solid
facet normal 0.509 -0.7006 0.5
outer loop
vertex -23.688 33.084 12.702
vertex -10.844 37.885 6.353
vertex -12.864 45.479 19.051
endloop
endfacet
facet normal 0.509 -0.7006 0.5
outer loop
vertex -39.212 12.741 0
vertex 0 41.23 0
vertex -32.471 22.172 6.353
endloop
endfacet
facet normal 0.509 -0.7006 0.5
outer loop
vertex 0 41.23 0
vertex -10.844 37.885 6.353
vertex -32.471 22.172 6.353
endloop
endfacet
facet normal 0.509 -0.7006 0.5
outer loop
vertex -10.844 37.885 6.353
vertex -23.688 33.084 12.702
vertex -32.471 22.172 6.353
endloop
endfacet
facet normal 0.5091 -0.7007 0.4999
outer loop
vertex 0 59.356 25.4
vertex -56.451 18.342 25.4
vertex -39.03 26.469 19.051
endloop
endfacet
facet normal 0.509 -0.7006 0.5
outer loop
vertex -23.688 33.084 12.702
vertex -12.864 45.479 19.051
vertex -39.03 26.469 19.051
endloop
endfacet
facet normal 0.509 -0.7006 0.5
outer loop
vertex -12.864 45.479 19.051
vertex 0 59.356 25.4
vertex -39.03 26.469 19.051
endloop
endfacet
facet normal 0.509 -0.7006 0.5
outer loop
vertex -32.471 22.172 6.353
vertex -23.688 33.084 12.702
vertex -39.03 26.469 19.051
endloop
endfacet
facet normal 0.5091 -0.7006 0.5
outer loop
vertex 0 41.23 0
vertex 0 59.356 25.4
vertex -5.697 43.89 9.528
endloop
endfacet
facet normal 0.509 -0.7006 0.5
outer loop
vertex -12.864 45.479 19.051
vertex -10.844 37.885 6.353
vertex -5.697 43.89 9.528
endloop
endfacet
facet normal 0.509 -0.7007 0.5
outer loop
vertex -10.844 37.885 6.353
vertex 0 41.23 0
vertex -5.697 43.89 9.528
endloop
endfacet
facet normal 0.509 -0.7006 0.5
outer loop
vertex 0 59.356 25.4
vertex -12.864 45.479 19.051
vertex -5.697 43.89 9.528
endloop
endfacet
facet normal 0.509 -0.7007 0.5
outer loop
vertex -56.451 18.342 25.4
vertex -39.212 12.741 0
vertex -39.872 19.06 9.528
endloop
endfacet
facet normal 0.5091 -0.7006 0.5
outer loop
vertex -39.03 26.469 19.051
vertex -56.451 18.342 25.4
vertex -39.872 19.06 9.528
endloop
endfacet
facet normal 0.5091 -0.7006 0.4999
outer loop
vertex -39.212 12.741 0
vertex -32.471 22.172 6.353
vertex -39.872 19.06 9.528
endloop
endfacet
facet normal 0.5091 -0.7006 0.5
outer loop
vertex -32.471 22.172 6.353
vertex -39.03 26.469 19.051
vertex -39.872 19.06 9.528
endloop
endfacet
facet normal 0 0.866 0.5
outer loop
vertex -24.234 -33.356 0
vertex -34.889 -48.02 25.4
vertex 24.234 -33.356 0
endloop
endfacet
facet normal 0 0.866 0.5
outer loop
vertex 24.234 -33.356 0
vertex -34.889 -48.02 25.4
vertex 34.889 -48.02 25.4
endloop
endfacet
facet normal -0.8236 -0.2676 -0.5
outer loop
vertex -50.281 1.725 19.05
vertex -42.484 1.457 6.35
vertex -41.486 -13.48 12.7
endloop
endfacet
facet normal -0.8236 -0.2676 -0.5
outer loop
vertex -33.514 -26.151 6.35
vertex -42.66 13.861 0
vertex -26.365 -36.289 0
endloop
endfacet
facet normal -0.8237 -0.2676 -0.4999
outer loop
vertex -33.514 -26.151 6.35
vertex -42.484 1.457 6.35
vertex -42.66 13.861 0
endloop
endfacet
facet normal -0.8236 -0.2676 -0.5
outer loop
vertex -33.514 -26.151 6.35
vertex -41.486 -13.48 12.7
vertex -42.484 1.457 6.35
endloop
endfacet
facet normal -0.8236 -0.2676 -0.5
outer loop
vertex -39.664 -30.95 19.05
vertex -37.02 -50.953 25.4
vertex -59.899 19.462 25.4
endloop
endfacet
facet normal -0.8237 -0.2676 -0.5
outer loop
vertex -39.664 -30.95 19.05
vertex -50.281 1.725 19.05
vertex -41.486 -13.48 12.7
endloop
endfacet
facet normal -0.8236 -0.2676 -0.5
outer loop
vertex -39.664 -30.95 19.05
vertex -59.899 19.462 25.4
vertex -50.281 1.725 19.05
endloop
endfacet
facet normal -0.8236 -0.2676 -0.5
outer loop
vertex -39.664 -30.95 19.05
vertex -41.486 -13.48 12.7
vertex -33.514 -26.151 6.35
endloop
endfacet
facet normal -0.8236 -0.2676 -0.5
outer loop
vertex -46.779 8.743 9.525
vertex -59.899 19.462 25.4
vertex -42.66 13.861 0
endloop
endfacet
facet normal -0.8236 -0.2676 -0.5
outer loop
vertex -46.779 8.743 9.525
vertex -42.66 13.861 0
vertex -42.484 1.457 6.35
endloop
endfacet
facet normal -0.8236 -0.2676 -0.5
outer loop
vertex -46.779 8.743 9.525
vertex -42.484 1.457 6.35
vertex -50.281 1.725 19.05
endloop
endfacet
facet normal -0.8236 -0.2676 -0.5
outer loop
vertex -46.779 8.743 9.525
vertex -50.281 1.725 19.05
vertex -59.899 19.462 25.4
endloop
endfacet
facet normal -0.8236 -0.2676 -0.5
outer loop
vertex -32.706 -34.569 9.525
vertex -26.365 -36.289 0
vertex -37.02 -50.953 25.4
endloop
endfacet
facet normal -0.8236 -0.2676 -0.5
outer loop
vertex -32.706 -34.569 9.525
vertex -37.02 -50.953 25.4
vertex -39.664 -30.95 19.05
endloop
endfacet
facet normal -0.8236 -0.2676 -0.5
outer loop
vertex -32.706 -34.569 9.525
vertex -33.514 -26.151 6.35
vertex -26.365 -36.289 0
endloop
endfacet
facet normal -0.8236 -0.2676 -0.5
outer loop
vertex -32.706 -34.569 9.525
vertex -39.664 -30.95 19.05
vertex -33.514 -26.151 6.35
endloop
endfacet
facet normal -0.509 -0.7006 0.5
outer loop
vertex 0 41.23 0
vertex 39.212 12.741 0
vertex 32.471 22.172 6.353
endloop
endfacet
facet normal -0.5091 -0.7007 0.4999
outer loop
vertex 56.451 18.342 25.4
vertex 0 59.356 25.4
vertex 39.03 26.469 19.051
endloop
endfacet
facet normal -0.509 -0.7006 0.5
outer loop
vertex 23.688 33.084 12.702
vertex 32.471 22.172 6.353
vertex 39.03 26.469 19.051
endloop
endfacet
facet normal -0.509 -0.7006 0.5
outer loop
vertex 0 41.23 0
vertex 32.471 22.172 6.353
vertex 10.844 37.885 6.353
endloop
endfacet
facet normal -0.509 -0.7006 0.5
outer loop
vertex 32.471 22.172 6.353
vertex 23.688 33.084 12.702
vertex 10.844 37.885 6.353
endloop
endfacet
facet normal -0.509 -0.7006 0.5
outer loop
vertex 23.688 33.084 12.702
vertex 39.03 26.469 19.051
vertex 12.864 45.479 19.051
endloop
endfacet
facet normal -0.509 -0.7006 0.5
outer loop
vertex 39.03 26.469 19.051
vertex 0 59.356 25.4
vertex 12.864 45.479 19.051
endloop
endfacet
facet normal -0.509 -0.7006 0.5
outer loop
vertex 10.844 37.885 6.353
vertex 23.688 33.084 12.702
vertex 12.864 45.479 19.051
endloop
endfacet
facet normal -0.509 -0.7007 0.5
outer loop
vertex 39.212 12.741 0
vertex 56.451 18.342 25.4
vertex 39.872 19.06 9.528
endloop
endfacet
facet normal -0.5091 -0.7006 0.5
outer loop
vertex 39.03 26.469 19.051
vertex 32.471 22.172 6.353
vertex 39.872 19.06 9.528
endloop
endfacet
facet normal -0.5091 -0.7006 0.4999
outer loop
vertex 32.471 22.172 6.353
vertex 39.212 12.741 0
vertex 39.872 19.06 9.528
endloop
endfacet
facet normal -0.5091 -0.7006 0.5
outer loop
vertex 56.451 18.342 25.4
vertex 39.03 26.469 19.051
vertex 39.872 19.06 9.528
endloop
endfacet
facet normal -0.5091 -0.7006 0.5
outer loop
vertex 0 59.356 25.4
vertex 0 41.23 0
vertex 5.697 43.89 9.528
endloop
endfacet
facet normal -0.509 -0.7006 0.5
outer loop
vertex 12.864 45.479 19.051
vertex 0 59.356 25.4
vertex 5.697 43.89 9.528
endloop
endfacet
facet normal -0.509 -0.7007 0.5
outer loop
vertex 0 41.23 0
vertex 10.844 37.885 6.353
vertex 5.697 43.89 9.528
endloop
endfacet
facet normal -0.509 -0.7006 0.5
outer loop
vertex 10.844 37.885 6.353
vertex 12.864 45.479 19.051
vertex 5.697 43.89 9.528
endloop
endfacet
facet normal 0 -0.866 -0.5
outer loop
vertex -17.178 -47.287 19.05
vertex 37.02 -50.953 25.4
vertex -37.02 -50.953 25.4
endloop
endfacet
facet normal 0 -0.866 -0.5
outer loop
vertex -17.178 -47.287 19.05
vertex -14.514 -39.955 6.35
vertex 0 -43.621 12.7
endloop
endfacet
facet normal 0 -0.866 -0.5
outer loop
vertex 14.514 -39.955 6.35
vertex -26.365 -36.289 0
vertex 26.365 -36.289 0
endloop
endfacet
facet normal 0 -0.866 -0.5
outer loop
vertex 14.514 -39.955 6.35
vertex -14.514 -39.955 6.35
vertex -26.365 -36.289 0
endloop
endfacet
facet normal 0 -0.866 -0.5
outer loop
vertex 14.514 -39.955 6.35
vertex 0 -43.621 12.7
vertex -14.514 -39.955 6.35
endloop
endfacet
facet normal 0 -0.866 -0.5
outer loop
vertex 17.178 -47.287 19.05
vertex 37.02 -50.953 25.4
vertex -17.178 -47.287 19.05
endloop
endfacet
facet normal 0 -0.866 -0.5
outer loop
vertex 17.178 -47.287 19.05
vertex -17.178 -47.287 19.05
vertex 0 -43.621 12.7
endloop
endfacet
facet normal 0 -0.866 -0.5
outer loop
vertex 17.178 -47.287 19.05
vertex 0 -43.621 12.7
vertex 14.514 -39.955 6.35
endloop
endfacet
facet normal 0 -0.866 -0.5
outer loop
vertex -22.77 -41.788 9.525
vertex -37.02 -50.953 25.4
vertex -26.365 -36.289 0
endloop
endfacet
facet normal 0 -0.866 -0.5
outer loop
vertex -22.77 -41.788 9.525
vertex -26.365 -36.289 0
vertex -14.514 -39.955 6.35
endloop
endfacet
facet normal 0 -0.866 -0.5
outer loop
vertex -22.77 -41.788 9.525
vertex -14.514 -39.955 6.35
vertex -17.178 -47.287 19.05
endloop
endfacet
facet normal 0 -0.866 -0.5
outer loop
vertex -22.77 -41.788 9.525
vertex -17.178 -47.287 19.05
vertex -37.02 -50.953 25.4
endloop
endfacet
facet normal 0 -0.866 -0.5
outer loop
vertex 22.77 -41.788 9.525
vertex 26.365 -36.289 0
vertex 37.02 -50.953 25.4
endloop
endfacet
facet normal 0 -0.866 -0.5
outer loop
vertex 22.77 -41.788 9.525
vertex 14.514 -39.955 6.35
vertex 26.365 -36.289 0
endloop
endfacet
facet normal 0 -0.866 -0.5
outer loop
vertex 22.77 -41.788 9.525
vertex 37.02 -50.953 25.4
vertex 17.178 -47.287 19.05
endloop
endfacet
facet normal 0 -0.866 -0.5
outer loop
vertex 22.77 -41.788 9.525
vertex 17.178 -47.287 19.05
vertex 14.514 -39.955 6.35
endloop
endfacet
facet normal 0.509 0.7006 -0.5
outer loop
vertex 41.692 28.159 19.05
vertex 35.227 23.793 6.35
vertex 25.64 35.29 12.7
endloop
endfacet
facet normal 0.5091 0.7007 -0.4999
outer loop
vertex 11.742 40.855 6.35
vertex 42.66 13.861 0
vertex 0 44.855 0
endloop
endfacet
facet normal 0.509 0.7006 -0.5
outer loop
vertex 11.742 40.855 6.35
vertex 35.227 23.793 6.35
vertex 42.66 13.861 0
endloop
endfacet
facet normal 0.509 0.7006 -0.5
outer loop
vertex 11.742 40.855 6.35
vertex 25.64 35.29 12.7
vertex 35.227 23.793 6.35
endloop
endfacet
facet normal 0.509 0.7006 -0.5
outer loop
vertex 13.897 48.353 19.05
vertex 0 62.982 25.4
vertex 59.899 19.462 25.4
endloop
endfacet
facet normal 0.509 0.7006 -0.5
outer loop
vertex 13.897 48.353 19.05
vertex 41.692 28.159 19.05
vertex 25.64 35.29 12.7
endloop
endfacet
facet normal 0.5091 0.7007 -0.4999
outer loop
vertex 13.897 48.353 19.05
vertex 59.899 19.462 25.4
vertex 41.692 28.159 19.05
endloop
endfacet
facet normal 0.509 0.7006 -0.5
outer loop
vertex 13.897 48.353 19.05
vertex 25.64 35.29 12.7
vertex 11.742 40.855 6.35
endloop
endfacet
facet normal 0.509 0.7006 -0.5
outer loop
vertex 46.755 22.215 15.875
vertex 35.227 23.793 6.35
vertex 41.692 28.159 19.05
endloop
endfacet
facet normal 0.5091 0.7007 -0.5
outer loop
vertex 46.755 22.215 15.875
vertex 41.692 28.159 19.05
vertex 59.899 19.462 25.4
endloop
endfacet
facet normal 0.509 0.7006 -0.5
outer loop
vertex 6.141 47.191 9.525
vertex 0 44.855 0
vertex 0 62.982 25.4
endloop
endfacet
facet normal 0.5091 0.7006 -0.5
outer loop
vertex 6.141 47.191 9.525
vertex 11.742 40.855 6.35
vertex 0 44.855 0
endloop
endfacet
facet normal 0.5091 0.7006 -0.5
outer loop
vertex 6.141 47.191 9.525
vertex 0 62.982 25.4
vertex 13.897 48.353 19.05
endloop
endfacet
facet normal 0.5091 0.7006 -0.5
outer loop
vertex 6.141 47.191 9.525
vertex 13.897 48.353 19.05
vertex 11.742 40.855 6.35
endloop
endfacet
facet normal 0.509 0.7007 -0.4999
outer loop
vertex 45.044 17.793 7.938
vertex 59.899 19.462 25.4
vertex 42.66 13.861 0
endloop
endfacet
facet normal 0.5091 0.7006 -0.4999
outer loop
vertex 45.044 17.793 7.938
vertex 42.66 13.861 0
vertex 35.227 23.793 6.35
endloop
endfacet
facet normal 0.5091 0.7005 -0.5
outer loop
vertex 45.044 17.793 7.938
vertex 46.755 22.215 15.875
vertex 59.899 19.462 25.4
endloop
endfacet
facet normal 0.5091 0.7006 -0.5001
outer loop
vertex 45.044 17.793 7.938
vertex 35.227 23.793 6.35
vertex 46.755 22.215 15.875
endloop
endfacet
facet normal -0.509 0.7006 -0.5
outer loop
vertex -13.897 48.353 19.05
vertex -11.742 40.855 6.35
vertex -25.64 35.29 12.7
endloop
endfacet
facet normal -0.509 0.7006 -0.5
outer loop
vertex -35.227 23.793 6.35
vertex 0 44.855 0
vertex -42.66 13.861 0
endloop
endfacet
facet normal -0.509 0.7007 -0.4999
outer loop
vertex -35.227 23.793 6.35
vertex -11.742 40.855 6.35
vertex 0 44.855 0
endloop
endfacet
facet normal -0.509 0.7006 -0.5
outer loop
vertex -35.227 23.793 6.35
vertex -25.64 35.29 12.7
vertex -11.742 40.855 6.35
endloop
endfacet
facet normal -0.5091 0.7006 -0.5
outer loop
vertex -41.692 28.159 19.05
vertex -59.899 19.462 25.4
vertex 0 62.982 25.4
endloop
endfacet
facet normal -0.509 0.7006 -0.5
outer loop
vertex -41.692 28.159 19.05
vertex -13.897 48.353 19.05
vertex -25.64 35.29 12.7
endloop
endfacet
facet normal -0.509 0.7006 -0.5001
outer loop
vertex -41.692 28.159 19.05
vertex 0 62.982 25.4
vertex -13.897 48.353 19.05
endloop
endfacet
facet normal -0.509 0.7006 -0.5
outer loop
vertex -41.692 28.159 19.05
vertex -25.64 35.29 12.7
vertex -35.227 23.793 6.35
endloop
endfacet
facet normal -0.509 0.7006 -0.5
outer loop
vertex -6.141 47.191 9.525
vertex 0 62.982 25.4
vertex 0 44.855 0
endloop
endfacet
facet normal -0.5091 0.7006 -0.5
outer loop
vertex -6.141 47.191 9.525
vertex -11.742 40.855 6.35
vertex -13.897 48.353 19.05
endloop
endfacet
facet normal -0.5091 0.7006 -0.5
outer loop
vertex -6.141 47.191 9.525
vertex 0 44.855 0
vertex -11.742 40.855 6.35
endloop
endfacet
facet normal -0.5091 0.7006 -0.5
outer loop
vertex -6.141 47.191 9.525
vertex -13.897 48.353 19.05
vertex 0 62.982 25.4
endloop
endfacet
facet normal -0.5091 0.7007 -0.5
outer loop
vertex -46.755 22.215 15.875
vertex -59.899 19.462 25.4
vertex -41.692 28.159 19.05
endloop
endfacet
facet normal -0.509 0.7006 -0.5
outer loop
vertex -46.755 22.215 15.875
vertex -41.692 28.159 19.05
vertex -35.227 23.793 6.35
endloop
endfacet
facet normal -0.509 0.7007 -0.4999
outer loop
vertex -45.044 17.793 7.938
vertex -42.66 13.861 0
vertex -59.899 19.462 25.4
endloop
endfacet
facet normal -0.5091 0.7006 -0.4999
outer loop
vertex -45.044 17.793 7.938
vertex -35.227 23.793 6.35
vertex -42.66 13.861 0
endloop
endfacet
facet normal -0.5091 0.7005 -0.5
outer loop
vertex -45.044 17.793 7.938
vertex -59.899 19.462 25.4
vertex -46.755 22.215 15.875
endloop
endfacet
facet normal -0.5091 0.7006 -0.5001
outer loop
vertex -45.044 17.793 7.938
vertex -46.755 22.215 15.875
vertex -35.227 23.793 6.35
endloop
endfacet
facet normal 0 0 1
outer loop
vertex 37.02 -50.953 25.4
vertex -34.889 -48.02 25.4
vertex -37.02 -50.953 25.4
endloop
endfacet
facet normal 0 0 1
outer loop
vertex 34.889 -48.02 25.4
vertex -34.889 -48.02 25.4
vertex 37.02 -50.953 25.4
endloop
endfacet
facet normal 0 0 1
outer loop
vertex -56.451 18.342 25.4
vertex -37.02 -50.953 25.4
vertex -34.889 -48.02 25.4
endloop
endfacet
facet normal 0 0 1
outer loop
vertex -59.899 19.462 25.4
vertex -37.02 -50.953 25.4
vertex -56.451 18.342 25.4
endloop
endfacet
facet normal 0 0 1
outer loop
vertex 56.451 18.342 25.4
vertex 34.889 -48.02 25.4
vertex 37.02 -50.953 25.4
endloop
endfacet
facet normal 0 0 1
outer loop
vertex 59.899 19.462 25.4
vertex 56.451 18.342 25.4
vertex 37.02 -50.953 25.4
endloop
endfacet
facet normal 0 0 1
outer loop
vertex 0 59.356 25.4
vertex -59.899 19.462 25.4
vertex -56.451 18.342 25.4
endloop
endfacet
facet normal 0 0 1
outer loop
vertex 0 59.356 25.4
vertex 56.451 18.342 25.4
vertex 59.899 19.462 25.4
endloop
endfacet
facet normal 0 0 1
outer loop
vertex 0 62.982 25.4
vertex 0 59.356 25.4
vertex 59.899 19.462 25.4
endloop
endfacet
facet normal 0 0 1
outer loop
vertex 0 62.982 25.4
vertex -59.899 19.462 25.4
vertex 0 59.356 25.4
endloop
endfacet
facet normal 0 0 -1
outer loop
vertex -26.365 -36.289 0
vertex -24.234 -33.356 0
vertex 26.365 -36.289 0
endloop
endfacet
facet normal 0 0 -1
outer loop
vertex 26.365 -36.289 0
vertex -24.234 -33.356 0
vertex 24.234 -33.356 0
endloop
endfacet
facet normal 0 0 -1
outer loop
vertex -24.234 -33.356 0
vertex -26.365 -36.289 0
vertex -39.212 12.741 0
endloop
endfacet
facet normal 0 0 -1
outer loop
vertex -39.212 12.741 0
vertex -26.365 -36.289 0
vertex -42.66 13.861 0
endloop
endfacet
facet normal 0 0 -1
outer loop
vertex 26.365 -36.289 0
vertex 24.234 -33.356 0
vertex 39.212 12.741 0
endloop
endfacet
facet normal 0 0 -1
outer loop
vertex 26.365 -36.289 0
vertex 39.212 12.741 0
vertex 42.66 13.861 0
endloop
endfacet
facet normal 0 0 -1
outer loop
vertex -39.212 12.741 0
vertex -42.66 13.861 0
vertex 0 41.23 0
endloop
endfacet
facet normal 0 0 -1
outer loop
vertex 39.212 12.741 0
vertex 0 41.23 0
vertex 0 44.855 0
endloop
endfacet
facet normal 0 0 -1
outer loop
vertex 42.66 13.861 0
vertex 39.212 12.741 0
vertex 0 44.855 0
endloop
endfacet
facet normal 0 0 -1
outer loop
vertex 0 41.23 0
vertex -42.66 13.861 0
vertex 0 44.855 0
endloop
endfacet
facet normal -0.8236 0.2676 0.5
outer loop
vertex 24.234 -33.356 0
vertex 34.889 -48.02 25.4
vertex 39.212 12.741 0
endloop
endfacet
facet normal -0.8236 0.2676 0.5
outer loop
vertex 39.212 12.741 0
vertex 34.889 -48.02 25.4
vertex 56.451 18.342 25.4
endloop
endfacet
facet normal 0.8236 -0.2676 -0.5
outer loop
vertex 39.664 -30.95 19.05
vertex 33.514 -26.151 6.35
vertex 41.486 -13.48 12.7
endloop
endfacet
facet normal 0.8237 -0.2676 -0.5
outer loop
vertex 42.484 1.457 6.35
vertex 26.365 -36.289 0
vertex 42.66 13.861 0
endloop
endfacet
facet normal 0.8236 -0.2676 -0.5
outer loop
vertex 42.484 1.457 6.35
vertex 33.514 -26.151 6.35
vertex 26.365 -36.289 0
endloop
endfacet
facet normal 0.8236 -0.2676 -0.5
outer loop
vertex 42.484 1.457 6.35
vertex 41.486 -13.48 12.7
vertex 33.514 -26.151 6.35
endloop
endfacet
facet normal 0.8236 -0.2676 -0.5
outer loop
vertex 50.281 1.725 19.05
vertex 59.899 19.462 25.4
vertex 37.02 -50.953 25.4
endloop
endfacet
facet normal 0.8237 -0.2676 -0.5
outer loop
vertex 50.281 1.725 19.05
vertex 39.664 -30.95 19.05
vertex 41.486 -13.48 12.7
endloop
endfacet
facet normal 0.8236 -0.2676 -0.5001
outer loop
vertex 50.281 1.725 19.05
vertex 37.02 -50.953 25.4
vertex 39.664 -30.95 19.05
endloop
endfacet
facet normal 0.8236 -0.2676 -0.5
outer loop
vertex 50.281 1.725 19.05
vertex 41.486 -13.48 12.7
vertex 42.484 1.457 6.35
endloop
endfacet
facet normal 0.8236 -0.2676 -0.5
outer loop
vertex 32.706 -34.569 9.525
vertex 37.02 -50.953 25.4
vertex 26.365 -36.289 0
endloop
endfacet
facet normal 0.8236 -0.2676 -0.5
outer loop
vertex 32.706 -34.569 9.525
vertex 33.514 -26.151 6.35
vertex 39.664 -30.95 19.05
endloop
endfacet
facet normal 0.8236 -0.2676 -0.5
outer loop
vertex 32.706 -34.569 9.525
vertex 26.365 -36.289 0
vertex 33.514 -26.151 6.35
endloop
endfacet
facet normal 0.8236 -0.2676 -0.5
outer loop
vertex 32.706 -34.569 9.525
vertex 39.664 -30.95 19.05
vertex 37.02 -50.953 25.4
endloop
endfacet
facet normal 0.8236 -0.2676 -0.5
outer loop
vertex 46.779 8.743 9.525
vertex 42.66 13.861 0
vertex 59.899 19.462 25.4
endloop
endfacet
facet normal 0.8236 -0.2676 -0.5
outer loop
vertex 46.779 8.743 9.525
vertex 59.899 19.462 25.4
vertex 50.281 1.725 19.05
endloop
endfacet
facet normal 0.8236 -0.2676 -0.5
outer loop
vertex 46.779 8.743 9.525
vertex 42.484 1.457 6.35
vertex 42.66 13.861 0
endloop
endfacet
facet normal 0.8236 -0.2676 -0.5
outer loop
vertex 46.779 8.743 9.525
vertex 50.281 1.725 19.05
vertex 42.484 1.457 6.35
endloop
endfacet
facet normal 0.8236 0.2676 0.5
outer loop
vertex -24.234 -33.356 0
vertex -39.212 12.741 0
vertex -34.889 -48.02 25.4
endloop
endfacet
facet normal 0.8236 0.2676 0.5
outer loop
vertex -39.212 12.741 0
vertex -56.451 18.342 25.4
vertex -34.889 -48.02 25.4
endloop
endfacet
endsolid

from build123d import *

# Parameters (mm, degrees)
F1_DEPTH = 25.4
F1_TAPER = -30
F2_T     = -2.54


with BuildPart() as f1:
    # F0 (on Top) → F1 (new body)
    with BuildSketch(Plane.XY):
        Polygon((-26.3652087767, -36.2885966897), (26.3652087767, -36.2885966897), (42.6598039212, 13.8610105314), (0, 44.8551723165), (-42.6598039212, 13.8610105314), align=None)
    extrude(amount=F1_DEPTH, taper=F1_TAPER)

    # F2
    f2_openings = [f1.faces().sort_by_distance(p)[0] for p in [
        (0, 0, 25.4),
        (0, 0, 0),
    ]]
    offset(amount=F2_T, openings=f2_openings, kind=Kind.INTERSECTION)


solid = f1.part
